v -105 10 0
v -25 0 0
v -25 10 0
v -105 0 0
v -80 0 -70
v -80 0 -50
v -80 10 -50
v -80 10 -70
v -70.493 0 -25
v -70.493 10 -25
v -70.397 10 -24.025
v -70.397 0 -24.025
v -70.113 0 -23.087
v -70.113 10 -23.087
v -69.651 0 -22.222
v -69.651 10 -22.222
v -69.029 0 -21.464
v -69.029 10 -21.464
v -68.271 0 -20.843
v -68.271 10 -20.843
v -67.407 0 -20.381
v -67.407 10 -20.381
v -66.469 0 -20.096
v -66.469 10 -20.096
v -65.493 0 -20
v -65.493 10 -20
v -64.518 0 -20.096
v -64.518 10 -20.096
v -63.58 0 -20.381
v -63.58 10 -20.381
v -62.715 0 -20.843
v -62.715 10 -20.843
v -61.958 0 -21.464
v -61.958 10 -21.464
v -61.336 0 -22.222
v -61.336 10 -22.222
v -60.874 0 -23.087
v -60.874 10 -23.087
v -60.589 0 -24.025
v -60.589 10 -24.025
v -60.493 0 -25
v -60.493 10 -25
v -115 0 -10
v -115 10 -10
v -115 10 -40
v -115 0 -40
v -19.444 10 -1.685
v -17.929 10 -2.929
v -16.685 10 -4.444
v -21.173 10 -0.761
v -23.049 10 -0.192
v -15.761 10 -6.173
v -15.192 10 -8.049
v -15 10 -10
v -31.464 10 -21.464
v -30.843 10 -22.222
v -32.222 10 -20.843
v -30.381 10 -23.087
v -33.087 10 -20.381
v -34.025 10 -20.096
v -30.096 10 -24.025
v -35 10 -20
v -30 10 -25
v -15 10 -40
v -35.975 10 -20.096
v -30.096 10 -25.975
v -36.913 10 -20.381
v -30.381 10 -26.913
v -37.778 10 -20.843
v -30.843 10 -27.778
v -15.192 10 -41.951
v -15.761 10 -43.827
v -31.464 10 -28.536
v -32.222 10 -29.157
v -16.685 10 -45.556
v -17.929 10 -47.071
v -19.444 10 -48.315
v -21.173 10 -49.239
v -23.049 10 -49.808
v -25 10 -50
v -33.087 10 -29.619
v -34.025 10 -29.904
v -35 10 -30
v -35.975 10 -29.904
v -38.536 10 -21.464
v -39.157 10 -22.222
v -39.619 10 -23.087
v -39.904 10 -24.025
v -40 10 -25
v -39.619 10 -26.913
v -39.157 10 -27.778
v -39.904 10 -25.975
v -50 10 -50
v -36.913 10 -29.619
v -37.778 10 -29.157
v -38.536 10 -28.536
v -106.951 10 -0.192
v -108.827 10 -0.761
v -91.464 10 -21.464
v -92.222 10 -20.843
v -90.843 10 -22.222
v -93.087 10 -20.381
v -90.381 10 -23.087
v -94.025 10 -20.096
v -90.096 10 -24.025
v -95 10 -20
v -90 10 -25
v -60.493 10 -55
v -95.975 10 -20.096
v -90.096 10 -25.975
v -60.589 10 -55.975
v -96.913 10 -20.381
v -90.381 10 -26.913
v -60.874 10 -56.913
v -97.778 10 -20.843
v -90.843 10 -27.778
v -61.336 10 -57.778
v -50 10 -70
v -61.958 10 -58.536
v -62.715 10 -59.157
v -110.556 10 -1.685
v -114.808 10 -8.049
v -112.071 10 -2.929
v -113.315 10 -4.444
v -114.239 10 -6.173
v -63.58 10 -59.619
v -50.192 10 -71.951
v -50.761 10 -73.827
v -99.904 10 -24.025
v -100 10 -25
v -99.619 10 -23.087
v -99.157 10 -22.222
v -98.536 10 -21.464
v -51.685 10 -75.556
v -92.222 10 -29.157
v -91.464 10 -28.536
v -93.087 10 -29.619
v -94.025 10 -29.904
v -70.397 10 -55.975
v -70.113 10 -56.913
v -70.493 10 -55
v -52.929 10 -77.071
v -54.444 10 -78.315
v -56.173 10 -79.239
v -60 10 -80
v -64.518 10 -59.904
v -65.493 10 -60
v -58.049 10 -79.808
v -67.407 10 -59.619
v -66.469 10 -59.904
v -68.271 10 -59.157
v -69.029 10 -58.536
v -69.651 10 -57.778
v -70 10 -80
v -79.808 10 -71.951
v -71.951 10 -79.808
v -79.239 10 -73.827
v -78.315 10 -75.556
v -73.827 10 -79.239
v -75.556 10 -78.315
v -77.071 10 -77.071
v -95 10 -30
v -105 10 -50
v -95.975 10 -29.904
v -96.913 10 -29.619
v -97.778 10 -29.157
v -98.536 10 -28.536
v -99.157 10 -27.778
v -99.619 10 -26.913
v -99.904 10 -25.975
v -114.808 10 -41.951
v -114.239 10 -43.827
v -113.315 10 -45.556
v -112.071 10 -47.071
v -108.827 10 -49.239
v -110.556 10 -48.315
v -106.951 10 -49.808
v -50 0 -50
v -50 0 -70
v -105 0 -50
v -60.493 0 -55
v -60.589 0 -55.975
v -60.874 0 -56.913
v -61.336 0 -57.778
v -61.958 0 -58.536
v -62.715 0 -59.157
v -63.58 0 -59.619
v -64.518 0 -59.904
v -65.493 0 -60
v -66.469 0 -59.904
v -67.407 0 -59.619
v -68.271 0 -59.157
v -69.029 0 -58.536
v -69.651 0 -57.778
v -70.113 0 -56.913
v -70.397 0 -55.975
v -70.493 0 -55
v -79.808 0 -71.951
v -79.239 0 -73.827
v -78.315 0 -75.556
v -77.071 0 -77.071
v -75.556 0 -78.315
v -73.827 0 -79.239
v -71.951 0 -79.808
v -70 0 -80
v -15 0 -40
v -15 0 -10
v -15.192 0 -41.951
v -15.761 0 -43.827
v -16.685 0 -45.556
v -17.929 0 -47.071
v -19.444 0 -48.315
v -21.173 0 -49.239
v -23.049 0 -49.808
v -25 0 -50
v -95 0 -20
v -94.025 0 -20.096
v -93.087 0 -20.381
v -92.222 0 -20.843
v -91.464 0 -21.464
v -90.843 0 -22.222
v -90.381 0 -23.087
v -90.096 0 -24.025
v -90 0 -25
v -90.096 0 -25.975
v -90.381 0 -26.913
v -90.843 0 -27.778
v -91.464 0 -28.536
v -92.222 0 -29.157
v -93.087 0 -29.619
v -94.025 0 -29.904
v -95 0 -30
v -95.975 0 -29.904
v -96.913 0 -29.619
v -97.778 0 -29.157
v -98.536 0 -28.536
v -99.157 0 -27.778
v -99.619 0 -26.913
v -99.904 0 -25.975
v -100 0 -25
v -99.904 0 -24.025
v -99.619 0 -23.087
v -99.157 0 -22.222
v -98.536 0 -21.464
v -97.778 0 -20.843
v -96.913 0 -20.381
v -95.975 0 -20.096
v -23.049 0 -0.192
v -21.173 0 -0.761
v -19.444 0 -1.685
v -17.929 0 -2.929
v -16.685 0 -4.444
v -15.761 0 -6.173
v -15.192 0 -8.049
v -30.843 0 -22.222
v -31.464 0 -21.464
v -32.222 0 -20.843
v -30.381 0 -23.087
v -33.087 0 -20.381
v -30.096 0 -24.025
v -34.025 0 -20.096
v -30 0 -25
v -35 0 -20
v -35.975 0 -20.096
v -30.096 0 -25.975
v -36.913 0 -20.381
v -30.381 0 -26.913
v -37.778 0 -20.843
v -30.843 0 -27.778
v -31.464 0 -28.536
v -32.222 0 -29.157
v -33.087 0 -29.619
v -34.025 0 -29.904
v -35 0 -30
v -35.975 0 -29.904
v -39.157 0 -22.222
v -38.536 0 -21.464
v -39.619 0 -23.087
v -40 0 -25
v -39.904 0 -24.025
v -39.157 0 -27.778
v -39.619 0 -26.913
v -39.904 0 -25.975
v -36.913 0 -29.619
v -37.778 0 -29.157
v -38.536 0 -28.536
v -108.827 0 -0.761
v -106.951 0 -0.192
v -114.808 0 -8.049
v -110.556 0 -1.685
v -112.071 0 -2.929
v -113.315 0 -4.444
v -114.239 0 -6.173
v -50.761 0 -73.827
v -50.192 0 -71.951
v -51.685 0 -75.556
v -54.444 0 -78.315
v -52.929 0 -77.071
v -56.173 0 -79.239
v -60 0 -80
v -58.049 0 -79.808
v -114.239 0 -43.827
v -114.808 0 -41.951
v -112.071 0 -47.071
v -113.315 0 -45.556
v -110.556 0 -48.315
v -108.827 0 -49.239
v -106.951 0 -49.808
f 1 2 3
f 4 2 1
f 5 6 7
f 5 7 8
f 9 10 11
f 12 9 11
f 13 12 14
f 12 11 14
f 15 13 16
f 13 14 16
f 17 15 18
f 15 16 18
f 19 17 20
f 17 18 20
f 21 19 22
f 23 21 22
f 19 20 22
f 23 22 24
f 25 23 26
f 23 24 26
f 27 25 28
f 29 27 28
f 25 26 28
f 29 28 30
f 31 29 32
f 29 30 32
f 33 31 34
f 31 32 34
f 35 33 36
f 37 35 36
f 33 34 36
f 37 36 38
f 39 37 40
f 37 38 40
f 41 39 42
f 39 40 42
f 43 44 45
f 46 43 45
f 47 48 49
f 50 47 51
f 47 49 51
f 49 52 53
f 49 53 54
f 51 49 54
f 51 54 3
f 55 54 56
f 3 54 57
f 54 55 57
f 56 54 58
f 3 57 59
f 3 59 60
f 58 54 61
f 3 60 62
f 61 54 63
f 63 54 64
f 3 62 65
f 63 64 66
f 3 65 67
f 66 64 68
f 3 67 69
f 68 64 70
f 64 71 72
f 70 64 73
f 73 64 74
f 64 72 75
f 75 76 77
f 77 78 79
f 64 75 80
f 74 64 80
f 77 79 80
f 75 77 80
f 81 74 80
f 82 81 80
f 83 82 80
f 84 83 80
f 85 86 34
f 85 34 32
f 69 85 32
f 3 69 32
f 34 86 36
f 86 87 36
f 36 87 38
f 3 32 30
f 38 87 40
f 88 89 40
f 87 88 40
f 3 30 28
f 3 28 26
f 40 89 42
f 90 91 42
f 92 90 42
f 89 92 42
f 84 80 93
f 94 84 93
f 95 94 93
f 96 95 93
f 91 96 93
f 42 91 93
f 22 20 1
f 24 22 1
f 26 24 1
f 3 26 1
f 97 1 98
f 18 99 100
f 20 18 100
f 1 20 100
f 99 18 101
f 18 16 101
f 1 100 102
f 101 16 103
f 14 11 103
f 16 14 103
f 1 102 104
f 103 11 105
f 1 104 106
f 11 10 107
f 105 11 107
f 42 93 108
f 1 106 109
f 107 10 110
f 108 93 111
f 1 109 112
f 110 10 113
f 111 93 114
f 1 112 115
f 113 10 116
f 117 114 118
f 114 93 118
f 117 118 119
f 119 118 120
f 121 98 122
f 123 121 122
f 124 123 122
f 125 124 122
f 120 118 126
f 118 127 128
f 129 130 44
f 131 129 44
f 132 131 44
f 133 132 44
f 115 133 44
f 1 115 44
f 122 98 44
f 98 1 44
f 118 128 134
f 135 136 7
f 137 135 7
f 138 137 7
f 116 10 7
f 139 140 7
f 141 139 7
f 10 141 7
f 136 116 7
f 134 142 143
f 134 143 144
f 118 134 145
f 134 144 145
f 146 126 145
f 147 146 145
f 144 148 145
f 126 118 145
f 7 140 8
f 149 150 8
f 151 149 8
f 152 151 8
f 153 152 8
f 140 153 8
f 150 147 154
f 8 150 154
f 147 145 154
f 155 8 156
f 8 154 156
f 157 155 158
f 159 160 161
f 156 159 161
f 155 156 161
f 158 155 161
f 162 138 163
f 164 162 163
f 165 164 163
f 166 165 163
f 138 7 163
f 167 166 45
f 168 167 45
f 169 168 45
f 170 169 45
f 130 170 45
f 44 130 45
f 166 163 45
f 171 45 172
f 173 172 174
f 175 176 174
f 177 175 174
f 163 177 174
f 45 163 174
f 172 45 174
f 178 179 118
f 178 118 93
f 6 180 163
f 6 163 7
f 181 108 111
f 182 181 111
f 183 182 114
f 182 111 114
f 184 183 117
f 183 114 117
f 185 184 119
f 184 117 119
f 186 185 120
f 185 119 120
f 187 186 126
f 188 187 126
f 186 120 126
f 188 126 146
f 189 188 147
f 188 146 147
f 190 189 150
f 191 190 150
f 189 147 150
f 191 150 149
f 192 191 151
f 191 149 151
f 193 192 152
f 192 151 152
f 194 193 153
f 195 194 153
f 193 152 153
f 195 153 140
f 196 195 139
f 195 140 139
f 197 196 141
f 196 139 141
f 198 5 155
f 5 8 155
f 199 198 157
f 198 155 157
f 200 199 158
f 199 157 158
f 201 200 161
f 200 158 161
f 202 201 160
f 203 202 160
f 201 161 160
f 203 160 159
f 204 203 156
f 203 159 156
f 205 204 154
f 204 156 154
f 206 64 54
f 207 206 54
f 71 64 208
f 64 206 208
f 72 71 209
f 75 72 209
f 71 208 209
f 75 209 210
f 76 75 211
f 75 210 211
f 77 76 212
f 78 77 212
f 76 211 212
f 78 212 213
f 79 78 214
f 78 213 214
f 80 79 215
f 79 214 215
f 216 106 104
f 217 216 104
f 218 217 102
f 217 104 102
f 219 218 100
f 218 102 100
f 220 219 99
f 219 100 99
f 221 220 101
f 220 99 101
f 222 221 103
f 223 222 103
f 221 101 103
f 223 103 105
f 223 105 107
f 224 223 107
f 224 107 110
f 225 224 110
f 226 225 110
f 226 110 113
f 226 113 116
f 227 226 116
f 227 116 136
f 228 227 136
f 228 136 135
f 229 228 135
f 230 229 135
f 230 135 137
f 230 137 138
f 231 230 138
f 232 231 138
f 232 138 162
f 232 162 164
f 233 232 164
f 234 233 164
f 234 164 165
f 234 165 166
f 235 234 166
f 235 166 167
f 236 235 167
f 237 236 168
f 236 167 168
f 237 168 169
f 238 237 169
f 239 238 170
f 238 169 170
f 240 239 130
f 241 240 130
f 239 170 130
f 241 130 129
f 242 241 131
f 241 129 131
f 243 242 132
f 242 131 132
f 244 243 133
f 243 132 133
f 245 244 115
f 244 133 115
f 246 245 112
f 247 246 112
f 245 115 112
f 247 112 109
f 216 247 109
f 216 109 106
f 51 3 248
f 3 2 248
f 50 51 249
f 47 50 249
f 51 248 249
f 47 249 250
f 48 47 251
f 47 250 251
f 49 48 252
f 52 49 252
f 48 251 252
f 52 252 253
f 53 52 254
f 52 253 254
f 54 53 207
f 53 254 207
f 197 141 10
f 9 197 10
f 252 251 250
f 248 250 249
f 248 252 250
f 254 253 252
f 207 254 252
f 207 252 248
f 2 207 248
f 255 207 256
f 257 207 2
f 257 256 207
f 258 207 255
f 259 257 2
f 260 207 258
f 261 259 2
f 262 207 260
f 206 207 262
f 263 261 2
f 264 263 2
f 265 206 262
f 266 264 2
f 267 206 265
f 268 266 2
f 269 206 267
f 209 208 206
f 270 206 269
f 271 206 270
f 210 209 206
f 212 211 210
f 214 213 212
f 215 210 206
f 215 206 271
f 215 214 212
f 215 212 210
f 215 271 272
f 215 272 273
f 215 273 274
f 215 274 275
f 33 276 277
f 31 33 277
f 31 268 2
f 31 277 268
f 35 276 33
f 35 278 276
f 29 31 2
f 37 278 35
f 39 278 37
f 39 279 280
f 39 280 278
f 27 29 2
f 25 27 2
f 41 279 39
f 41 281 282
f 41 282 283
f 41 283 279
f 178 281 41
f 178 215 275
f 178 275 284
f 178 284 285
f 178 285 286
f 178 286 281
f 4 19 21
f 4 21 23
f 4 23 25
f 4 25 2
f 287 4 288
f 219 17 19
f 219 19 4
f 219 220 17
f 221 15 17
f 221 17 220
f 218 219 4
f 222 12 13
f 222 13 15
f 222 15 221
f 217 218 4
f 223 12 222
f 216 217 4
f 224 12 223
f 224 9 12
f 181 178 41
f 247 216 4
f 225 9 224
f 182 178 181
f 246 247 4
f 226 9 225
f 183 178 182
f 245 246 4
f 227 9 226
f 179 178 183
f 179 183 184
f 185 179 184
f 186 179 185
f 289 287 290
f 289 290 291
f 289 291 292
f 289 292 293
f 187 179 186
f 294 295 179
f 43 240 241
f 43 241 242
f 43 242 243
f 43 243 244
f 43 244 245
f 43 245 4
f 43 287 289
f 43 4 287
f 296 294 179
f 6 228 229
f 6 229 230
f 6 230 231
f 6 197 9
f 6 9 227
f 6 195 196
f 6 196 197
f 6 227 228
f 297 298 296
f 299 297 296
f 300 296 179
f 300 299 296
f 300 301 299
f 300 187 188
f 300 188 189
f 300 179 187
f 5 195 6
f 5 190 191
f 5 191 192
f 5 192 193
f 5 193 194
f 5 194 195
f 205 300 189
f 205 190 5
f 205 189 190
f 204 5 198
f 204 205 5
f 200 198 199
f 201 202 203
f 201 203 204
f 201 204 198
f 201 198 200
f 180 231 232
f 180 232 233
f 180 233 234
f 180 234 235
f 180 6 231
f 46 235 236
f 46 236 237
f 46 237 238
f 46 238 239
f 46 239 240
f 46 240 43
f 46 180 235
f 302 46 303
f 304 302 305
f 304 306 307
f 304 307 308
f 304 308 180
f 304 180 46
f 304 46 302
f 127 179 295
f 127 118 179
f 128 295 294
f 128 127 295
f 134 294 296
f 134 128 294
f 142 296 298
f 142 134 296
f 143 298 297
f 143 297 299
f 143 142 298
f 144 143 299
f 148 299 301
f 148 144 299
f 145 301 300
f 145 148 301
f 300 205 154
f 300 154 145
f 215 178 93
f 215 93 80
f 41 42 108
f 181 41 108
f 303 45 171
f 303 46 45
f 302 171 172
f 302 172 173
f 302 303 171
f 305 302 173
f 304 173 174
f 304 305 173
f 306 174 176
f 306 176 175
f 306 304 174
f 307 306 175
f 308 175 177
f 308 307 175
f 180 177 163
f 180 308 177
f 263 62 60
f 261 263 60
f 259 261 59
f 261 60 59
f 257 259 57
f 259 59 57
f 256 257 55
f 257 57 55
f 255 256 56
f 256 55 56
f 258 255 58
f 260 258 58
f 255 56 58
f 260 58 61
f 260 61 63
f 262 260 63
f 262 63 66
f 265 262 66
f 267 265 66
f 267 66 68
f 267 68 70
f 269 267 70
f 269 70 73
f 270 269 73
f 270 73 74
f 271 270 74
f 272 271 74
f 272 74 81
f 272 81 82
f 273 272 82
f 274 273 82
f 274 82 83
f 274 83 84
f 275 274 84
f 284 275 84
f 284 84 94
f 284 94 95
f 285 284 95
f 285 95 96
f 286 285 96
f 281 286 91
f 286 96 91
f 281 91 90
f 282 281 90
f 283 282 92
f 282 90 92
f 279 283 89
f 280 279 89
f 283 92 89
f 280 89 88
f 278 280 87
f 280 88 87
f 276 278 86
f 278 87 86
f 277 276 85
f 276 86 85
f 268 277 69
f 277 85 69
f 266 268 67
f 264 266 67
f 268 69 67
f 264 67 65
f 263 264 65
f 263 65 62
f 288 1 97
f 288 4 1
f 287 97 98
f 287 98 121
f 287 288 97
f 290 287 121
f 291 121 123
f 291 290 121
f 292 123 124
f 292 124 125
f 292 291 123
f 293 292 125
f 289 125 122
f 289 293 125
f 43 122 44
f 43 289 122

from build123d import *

# Parameters (mm, degrees)
BOSS_EXTRUDE1_DEPTH = 10
SKETCH2_R           = 5
CUT_EXTRUDE1_DEPTH  = 26
FILLET4_R           = 10
FILLET5_R           = 10
FILLET6_R           = 10
FILLET7_R           = 10
CUT_EXTRUDE2_DEPTH  = 26
FILLET9_R           = 10
CUT_EXTRUDE3_DEPTH  = 31
CUT_EXTRUDE5_DEPTH  = 32
FILLET10_R          = 10
FILLET11_R          = 10
FILLET12_R          = 10
FILLET13_R          = 10


with BuildPart() as part:
    # Sketch1 → Boss-Extrude1 (new body)
    with BuildSketch(Plane(origin=(0, 0, 0), x_dir=(1, 0, 0), z_dir=(0, 1, 0))):
        Polygon((0, 0), (-130, 0), (-130, 50), (-80, 50), (-80, 80), (-50, 80), (-50, 50), (0, 50), align=None)
    extrude(amount=BOSS_EXTRUDE1_DEPTH)

    # Sketch2 → Cut-Extrude1 (cut)
    with BuildSketch(Plane(origin=(0, 10, 0), x_dir=(1, 0, 0), z_dir=(0, 1, 0))):
        with Locations(Location((-95, 25, 0), (0, 0, 270))):
            Circle(SKETCH2_R)
        with Locations(Location((-35, 25, 0), (0, 0, 270))):
            Circle(SKETCH2_R)
    extrude(amount=-CUT_EXTRUDE1_DEPTH, mode=Mode.SUBTRACT)

    # Fillet4
    fillet4_edges = [part.edges().sort_by_distance(p)[0] for p in [
        (-130, 5, -50),
        (-80, 5, -80),
    ]]
    fillet(fillet4_edges, radius=FILLET4_R)

    # Fillet5
    fillet5_edges = [part.edges().sort_by_distance(p)[0] for p in [
        (-50, 5, -80),
    ]]
    fillet(fillet5_edges, radius=FILLET5_R)

    # Fillet6
    fillet6_edges = [part.edges().sort_by_distance(p)[0] for p in [
        (0, 5, -50),
    ]]
    fillet(fillet6_edges, radius=FILLET6_R)

    # Fillet7
    fillet7_edges = [part.edges().sort_by_distance(p)[0] for p in [
        (0, 5, 0),
    ]]
    fillet(fillet7_edges, radius=FILLET7_R)

    # Sketch3 → Cut-Extrude2 (cut)
    with BuildSketch(Plane(origin=(0, 10, 0), x_dir=(1, 0, 0), z_dir=(0, 1, 0))):
        with BuildLine():
            Line((-70.493261523, 55), (-70.493261523, 25))
            ThreePointArc((-70.493261523, 25), (-65.493261523, 20), (-60.493261523, 25))
            Line((-60.493261523, 25), (-60.493261523, 55))
            ThreePointArc((-60.493261523, 55), (-65.493261523, 60), (-70.493261523, 55))
        make_face()
    extrude(amount=-CUT_EXTRUDE2_DEPTH, mode=Mode.SUBTRACT)

    # Fillet9
    fillet9_edges = [part.edges().sort_by_distance(p)[0] for p in [
        (-130, 5, 0),
    ]]
    fillet(fillet9_edges, radius=FILLET9_R)

    # Sketch5 → Cut-Extrude3 (cut)
    with BuildSketch(Plane(origin=(0, 10, 0), x_dir=(1, 0, 0), z_dir=(0, 1, 0))):
        with BuildLine():
            Line((-115, 0), (-115, 50))
            Line((-115, 50), (-120, 50))
            ThreePointArc((-120, 50), (-127.071067812, 47.071067812), (-130, 40))
            Line((-130, 40), (-130, 10))
            ThreePointArc((-130, 10), (-127.071067812, 2.928932188), (-120, 0))
            Line((-120, 0), (-115, 0))
        make_face()
    extrude(amount=-CUT_EXTRUDE3_DEPTH, mode=Mode.SUBTRACT)

    # Sketch6 → Cut-Extrude5 (cut)
    with BuildSketch(Plane(origin=(0, 10, 0), x_dir=(1, 0, 0), z_dir=(0, 1, 0))):
        with BuildLine():
            Line((-10, 50), (-15, 50))
            Line((-15, 50), (-15, 0))
            Line((-15, 0), (-10, 0))
            ThreePointArc((-10, 0), (-2.928932188, 2.928932188), (0, 10))
            Line((0, 10), (0, 40))
            ThreePointArc((0, 40), (-2.928932188, 47.071067812), (-10, 50))
        make_face()
    extrude(amount=-CUT_EXTRUDE5_DEPTH, mode=Mode.SUBTRACT)

    # Fillet10
    fillet10_edges = [part.edges().sort_by_distance(p)[0] for p in [
        (-15, 5, -50),
    ]]
    fillet(fillet10_edges, radius=FILLET10_R)

    # Fillet11
    fillet11_edges = [part.edges().sort_by_distance(p)[0] for p in [
        (-115, 5, -50),
    ]]
    fillet(fillet11_edges, radius=FILLET11_R)

    # Fillet12
    fillet12_edges = [part.edges().sort_by_distance(p)[0] for p in [
        (-15, 5, 0),
    ]]
    fillet(fillet12_edges, radius=FILLET12_R)

    # Fillet13
    fillet13_edges = [part.edges().sort_by_distance(p)[0] for p in [
        (-115, 5, 0),
    ]]
    fillet(fillet13_edges, radius=FILLET13_R)


solid = part.part
